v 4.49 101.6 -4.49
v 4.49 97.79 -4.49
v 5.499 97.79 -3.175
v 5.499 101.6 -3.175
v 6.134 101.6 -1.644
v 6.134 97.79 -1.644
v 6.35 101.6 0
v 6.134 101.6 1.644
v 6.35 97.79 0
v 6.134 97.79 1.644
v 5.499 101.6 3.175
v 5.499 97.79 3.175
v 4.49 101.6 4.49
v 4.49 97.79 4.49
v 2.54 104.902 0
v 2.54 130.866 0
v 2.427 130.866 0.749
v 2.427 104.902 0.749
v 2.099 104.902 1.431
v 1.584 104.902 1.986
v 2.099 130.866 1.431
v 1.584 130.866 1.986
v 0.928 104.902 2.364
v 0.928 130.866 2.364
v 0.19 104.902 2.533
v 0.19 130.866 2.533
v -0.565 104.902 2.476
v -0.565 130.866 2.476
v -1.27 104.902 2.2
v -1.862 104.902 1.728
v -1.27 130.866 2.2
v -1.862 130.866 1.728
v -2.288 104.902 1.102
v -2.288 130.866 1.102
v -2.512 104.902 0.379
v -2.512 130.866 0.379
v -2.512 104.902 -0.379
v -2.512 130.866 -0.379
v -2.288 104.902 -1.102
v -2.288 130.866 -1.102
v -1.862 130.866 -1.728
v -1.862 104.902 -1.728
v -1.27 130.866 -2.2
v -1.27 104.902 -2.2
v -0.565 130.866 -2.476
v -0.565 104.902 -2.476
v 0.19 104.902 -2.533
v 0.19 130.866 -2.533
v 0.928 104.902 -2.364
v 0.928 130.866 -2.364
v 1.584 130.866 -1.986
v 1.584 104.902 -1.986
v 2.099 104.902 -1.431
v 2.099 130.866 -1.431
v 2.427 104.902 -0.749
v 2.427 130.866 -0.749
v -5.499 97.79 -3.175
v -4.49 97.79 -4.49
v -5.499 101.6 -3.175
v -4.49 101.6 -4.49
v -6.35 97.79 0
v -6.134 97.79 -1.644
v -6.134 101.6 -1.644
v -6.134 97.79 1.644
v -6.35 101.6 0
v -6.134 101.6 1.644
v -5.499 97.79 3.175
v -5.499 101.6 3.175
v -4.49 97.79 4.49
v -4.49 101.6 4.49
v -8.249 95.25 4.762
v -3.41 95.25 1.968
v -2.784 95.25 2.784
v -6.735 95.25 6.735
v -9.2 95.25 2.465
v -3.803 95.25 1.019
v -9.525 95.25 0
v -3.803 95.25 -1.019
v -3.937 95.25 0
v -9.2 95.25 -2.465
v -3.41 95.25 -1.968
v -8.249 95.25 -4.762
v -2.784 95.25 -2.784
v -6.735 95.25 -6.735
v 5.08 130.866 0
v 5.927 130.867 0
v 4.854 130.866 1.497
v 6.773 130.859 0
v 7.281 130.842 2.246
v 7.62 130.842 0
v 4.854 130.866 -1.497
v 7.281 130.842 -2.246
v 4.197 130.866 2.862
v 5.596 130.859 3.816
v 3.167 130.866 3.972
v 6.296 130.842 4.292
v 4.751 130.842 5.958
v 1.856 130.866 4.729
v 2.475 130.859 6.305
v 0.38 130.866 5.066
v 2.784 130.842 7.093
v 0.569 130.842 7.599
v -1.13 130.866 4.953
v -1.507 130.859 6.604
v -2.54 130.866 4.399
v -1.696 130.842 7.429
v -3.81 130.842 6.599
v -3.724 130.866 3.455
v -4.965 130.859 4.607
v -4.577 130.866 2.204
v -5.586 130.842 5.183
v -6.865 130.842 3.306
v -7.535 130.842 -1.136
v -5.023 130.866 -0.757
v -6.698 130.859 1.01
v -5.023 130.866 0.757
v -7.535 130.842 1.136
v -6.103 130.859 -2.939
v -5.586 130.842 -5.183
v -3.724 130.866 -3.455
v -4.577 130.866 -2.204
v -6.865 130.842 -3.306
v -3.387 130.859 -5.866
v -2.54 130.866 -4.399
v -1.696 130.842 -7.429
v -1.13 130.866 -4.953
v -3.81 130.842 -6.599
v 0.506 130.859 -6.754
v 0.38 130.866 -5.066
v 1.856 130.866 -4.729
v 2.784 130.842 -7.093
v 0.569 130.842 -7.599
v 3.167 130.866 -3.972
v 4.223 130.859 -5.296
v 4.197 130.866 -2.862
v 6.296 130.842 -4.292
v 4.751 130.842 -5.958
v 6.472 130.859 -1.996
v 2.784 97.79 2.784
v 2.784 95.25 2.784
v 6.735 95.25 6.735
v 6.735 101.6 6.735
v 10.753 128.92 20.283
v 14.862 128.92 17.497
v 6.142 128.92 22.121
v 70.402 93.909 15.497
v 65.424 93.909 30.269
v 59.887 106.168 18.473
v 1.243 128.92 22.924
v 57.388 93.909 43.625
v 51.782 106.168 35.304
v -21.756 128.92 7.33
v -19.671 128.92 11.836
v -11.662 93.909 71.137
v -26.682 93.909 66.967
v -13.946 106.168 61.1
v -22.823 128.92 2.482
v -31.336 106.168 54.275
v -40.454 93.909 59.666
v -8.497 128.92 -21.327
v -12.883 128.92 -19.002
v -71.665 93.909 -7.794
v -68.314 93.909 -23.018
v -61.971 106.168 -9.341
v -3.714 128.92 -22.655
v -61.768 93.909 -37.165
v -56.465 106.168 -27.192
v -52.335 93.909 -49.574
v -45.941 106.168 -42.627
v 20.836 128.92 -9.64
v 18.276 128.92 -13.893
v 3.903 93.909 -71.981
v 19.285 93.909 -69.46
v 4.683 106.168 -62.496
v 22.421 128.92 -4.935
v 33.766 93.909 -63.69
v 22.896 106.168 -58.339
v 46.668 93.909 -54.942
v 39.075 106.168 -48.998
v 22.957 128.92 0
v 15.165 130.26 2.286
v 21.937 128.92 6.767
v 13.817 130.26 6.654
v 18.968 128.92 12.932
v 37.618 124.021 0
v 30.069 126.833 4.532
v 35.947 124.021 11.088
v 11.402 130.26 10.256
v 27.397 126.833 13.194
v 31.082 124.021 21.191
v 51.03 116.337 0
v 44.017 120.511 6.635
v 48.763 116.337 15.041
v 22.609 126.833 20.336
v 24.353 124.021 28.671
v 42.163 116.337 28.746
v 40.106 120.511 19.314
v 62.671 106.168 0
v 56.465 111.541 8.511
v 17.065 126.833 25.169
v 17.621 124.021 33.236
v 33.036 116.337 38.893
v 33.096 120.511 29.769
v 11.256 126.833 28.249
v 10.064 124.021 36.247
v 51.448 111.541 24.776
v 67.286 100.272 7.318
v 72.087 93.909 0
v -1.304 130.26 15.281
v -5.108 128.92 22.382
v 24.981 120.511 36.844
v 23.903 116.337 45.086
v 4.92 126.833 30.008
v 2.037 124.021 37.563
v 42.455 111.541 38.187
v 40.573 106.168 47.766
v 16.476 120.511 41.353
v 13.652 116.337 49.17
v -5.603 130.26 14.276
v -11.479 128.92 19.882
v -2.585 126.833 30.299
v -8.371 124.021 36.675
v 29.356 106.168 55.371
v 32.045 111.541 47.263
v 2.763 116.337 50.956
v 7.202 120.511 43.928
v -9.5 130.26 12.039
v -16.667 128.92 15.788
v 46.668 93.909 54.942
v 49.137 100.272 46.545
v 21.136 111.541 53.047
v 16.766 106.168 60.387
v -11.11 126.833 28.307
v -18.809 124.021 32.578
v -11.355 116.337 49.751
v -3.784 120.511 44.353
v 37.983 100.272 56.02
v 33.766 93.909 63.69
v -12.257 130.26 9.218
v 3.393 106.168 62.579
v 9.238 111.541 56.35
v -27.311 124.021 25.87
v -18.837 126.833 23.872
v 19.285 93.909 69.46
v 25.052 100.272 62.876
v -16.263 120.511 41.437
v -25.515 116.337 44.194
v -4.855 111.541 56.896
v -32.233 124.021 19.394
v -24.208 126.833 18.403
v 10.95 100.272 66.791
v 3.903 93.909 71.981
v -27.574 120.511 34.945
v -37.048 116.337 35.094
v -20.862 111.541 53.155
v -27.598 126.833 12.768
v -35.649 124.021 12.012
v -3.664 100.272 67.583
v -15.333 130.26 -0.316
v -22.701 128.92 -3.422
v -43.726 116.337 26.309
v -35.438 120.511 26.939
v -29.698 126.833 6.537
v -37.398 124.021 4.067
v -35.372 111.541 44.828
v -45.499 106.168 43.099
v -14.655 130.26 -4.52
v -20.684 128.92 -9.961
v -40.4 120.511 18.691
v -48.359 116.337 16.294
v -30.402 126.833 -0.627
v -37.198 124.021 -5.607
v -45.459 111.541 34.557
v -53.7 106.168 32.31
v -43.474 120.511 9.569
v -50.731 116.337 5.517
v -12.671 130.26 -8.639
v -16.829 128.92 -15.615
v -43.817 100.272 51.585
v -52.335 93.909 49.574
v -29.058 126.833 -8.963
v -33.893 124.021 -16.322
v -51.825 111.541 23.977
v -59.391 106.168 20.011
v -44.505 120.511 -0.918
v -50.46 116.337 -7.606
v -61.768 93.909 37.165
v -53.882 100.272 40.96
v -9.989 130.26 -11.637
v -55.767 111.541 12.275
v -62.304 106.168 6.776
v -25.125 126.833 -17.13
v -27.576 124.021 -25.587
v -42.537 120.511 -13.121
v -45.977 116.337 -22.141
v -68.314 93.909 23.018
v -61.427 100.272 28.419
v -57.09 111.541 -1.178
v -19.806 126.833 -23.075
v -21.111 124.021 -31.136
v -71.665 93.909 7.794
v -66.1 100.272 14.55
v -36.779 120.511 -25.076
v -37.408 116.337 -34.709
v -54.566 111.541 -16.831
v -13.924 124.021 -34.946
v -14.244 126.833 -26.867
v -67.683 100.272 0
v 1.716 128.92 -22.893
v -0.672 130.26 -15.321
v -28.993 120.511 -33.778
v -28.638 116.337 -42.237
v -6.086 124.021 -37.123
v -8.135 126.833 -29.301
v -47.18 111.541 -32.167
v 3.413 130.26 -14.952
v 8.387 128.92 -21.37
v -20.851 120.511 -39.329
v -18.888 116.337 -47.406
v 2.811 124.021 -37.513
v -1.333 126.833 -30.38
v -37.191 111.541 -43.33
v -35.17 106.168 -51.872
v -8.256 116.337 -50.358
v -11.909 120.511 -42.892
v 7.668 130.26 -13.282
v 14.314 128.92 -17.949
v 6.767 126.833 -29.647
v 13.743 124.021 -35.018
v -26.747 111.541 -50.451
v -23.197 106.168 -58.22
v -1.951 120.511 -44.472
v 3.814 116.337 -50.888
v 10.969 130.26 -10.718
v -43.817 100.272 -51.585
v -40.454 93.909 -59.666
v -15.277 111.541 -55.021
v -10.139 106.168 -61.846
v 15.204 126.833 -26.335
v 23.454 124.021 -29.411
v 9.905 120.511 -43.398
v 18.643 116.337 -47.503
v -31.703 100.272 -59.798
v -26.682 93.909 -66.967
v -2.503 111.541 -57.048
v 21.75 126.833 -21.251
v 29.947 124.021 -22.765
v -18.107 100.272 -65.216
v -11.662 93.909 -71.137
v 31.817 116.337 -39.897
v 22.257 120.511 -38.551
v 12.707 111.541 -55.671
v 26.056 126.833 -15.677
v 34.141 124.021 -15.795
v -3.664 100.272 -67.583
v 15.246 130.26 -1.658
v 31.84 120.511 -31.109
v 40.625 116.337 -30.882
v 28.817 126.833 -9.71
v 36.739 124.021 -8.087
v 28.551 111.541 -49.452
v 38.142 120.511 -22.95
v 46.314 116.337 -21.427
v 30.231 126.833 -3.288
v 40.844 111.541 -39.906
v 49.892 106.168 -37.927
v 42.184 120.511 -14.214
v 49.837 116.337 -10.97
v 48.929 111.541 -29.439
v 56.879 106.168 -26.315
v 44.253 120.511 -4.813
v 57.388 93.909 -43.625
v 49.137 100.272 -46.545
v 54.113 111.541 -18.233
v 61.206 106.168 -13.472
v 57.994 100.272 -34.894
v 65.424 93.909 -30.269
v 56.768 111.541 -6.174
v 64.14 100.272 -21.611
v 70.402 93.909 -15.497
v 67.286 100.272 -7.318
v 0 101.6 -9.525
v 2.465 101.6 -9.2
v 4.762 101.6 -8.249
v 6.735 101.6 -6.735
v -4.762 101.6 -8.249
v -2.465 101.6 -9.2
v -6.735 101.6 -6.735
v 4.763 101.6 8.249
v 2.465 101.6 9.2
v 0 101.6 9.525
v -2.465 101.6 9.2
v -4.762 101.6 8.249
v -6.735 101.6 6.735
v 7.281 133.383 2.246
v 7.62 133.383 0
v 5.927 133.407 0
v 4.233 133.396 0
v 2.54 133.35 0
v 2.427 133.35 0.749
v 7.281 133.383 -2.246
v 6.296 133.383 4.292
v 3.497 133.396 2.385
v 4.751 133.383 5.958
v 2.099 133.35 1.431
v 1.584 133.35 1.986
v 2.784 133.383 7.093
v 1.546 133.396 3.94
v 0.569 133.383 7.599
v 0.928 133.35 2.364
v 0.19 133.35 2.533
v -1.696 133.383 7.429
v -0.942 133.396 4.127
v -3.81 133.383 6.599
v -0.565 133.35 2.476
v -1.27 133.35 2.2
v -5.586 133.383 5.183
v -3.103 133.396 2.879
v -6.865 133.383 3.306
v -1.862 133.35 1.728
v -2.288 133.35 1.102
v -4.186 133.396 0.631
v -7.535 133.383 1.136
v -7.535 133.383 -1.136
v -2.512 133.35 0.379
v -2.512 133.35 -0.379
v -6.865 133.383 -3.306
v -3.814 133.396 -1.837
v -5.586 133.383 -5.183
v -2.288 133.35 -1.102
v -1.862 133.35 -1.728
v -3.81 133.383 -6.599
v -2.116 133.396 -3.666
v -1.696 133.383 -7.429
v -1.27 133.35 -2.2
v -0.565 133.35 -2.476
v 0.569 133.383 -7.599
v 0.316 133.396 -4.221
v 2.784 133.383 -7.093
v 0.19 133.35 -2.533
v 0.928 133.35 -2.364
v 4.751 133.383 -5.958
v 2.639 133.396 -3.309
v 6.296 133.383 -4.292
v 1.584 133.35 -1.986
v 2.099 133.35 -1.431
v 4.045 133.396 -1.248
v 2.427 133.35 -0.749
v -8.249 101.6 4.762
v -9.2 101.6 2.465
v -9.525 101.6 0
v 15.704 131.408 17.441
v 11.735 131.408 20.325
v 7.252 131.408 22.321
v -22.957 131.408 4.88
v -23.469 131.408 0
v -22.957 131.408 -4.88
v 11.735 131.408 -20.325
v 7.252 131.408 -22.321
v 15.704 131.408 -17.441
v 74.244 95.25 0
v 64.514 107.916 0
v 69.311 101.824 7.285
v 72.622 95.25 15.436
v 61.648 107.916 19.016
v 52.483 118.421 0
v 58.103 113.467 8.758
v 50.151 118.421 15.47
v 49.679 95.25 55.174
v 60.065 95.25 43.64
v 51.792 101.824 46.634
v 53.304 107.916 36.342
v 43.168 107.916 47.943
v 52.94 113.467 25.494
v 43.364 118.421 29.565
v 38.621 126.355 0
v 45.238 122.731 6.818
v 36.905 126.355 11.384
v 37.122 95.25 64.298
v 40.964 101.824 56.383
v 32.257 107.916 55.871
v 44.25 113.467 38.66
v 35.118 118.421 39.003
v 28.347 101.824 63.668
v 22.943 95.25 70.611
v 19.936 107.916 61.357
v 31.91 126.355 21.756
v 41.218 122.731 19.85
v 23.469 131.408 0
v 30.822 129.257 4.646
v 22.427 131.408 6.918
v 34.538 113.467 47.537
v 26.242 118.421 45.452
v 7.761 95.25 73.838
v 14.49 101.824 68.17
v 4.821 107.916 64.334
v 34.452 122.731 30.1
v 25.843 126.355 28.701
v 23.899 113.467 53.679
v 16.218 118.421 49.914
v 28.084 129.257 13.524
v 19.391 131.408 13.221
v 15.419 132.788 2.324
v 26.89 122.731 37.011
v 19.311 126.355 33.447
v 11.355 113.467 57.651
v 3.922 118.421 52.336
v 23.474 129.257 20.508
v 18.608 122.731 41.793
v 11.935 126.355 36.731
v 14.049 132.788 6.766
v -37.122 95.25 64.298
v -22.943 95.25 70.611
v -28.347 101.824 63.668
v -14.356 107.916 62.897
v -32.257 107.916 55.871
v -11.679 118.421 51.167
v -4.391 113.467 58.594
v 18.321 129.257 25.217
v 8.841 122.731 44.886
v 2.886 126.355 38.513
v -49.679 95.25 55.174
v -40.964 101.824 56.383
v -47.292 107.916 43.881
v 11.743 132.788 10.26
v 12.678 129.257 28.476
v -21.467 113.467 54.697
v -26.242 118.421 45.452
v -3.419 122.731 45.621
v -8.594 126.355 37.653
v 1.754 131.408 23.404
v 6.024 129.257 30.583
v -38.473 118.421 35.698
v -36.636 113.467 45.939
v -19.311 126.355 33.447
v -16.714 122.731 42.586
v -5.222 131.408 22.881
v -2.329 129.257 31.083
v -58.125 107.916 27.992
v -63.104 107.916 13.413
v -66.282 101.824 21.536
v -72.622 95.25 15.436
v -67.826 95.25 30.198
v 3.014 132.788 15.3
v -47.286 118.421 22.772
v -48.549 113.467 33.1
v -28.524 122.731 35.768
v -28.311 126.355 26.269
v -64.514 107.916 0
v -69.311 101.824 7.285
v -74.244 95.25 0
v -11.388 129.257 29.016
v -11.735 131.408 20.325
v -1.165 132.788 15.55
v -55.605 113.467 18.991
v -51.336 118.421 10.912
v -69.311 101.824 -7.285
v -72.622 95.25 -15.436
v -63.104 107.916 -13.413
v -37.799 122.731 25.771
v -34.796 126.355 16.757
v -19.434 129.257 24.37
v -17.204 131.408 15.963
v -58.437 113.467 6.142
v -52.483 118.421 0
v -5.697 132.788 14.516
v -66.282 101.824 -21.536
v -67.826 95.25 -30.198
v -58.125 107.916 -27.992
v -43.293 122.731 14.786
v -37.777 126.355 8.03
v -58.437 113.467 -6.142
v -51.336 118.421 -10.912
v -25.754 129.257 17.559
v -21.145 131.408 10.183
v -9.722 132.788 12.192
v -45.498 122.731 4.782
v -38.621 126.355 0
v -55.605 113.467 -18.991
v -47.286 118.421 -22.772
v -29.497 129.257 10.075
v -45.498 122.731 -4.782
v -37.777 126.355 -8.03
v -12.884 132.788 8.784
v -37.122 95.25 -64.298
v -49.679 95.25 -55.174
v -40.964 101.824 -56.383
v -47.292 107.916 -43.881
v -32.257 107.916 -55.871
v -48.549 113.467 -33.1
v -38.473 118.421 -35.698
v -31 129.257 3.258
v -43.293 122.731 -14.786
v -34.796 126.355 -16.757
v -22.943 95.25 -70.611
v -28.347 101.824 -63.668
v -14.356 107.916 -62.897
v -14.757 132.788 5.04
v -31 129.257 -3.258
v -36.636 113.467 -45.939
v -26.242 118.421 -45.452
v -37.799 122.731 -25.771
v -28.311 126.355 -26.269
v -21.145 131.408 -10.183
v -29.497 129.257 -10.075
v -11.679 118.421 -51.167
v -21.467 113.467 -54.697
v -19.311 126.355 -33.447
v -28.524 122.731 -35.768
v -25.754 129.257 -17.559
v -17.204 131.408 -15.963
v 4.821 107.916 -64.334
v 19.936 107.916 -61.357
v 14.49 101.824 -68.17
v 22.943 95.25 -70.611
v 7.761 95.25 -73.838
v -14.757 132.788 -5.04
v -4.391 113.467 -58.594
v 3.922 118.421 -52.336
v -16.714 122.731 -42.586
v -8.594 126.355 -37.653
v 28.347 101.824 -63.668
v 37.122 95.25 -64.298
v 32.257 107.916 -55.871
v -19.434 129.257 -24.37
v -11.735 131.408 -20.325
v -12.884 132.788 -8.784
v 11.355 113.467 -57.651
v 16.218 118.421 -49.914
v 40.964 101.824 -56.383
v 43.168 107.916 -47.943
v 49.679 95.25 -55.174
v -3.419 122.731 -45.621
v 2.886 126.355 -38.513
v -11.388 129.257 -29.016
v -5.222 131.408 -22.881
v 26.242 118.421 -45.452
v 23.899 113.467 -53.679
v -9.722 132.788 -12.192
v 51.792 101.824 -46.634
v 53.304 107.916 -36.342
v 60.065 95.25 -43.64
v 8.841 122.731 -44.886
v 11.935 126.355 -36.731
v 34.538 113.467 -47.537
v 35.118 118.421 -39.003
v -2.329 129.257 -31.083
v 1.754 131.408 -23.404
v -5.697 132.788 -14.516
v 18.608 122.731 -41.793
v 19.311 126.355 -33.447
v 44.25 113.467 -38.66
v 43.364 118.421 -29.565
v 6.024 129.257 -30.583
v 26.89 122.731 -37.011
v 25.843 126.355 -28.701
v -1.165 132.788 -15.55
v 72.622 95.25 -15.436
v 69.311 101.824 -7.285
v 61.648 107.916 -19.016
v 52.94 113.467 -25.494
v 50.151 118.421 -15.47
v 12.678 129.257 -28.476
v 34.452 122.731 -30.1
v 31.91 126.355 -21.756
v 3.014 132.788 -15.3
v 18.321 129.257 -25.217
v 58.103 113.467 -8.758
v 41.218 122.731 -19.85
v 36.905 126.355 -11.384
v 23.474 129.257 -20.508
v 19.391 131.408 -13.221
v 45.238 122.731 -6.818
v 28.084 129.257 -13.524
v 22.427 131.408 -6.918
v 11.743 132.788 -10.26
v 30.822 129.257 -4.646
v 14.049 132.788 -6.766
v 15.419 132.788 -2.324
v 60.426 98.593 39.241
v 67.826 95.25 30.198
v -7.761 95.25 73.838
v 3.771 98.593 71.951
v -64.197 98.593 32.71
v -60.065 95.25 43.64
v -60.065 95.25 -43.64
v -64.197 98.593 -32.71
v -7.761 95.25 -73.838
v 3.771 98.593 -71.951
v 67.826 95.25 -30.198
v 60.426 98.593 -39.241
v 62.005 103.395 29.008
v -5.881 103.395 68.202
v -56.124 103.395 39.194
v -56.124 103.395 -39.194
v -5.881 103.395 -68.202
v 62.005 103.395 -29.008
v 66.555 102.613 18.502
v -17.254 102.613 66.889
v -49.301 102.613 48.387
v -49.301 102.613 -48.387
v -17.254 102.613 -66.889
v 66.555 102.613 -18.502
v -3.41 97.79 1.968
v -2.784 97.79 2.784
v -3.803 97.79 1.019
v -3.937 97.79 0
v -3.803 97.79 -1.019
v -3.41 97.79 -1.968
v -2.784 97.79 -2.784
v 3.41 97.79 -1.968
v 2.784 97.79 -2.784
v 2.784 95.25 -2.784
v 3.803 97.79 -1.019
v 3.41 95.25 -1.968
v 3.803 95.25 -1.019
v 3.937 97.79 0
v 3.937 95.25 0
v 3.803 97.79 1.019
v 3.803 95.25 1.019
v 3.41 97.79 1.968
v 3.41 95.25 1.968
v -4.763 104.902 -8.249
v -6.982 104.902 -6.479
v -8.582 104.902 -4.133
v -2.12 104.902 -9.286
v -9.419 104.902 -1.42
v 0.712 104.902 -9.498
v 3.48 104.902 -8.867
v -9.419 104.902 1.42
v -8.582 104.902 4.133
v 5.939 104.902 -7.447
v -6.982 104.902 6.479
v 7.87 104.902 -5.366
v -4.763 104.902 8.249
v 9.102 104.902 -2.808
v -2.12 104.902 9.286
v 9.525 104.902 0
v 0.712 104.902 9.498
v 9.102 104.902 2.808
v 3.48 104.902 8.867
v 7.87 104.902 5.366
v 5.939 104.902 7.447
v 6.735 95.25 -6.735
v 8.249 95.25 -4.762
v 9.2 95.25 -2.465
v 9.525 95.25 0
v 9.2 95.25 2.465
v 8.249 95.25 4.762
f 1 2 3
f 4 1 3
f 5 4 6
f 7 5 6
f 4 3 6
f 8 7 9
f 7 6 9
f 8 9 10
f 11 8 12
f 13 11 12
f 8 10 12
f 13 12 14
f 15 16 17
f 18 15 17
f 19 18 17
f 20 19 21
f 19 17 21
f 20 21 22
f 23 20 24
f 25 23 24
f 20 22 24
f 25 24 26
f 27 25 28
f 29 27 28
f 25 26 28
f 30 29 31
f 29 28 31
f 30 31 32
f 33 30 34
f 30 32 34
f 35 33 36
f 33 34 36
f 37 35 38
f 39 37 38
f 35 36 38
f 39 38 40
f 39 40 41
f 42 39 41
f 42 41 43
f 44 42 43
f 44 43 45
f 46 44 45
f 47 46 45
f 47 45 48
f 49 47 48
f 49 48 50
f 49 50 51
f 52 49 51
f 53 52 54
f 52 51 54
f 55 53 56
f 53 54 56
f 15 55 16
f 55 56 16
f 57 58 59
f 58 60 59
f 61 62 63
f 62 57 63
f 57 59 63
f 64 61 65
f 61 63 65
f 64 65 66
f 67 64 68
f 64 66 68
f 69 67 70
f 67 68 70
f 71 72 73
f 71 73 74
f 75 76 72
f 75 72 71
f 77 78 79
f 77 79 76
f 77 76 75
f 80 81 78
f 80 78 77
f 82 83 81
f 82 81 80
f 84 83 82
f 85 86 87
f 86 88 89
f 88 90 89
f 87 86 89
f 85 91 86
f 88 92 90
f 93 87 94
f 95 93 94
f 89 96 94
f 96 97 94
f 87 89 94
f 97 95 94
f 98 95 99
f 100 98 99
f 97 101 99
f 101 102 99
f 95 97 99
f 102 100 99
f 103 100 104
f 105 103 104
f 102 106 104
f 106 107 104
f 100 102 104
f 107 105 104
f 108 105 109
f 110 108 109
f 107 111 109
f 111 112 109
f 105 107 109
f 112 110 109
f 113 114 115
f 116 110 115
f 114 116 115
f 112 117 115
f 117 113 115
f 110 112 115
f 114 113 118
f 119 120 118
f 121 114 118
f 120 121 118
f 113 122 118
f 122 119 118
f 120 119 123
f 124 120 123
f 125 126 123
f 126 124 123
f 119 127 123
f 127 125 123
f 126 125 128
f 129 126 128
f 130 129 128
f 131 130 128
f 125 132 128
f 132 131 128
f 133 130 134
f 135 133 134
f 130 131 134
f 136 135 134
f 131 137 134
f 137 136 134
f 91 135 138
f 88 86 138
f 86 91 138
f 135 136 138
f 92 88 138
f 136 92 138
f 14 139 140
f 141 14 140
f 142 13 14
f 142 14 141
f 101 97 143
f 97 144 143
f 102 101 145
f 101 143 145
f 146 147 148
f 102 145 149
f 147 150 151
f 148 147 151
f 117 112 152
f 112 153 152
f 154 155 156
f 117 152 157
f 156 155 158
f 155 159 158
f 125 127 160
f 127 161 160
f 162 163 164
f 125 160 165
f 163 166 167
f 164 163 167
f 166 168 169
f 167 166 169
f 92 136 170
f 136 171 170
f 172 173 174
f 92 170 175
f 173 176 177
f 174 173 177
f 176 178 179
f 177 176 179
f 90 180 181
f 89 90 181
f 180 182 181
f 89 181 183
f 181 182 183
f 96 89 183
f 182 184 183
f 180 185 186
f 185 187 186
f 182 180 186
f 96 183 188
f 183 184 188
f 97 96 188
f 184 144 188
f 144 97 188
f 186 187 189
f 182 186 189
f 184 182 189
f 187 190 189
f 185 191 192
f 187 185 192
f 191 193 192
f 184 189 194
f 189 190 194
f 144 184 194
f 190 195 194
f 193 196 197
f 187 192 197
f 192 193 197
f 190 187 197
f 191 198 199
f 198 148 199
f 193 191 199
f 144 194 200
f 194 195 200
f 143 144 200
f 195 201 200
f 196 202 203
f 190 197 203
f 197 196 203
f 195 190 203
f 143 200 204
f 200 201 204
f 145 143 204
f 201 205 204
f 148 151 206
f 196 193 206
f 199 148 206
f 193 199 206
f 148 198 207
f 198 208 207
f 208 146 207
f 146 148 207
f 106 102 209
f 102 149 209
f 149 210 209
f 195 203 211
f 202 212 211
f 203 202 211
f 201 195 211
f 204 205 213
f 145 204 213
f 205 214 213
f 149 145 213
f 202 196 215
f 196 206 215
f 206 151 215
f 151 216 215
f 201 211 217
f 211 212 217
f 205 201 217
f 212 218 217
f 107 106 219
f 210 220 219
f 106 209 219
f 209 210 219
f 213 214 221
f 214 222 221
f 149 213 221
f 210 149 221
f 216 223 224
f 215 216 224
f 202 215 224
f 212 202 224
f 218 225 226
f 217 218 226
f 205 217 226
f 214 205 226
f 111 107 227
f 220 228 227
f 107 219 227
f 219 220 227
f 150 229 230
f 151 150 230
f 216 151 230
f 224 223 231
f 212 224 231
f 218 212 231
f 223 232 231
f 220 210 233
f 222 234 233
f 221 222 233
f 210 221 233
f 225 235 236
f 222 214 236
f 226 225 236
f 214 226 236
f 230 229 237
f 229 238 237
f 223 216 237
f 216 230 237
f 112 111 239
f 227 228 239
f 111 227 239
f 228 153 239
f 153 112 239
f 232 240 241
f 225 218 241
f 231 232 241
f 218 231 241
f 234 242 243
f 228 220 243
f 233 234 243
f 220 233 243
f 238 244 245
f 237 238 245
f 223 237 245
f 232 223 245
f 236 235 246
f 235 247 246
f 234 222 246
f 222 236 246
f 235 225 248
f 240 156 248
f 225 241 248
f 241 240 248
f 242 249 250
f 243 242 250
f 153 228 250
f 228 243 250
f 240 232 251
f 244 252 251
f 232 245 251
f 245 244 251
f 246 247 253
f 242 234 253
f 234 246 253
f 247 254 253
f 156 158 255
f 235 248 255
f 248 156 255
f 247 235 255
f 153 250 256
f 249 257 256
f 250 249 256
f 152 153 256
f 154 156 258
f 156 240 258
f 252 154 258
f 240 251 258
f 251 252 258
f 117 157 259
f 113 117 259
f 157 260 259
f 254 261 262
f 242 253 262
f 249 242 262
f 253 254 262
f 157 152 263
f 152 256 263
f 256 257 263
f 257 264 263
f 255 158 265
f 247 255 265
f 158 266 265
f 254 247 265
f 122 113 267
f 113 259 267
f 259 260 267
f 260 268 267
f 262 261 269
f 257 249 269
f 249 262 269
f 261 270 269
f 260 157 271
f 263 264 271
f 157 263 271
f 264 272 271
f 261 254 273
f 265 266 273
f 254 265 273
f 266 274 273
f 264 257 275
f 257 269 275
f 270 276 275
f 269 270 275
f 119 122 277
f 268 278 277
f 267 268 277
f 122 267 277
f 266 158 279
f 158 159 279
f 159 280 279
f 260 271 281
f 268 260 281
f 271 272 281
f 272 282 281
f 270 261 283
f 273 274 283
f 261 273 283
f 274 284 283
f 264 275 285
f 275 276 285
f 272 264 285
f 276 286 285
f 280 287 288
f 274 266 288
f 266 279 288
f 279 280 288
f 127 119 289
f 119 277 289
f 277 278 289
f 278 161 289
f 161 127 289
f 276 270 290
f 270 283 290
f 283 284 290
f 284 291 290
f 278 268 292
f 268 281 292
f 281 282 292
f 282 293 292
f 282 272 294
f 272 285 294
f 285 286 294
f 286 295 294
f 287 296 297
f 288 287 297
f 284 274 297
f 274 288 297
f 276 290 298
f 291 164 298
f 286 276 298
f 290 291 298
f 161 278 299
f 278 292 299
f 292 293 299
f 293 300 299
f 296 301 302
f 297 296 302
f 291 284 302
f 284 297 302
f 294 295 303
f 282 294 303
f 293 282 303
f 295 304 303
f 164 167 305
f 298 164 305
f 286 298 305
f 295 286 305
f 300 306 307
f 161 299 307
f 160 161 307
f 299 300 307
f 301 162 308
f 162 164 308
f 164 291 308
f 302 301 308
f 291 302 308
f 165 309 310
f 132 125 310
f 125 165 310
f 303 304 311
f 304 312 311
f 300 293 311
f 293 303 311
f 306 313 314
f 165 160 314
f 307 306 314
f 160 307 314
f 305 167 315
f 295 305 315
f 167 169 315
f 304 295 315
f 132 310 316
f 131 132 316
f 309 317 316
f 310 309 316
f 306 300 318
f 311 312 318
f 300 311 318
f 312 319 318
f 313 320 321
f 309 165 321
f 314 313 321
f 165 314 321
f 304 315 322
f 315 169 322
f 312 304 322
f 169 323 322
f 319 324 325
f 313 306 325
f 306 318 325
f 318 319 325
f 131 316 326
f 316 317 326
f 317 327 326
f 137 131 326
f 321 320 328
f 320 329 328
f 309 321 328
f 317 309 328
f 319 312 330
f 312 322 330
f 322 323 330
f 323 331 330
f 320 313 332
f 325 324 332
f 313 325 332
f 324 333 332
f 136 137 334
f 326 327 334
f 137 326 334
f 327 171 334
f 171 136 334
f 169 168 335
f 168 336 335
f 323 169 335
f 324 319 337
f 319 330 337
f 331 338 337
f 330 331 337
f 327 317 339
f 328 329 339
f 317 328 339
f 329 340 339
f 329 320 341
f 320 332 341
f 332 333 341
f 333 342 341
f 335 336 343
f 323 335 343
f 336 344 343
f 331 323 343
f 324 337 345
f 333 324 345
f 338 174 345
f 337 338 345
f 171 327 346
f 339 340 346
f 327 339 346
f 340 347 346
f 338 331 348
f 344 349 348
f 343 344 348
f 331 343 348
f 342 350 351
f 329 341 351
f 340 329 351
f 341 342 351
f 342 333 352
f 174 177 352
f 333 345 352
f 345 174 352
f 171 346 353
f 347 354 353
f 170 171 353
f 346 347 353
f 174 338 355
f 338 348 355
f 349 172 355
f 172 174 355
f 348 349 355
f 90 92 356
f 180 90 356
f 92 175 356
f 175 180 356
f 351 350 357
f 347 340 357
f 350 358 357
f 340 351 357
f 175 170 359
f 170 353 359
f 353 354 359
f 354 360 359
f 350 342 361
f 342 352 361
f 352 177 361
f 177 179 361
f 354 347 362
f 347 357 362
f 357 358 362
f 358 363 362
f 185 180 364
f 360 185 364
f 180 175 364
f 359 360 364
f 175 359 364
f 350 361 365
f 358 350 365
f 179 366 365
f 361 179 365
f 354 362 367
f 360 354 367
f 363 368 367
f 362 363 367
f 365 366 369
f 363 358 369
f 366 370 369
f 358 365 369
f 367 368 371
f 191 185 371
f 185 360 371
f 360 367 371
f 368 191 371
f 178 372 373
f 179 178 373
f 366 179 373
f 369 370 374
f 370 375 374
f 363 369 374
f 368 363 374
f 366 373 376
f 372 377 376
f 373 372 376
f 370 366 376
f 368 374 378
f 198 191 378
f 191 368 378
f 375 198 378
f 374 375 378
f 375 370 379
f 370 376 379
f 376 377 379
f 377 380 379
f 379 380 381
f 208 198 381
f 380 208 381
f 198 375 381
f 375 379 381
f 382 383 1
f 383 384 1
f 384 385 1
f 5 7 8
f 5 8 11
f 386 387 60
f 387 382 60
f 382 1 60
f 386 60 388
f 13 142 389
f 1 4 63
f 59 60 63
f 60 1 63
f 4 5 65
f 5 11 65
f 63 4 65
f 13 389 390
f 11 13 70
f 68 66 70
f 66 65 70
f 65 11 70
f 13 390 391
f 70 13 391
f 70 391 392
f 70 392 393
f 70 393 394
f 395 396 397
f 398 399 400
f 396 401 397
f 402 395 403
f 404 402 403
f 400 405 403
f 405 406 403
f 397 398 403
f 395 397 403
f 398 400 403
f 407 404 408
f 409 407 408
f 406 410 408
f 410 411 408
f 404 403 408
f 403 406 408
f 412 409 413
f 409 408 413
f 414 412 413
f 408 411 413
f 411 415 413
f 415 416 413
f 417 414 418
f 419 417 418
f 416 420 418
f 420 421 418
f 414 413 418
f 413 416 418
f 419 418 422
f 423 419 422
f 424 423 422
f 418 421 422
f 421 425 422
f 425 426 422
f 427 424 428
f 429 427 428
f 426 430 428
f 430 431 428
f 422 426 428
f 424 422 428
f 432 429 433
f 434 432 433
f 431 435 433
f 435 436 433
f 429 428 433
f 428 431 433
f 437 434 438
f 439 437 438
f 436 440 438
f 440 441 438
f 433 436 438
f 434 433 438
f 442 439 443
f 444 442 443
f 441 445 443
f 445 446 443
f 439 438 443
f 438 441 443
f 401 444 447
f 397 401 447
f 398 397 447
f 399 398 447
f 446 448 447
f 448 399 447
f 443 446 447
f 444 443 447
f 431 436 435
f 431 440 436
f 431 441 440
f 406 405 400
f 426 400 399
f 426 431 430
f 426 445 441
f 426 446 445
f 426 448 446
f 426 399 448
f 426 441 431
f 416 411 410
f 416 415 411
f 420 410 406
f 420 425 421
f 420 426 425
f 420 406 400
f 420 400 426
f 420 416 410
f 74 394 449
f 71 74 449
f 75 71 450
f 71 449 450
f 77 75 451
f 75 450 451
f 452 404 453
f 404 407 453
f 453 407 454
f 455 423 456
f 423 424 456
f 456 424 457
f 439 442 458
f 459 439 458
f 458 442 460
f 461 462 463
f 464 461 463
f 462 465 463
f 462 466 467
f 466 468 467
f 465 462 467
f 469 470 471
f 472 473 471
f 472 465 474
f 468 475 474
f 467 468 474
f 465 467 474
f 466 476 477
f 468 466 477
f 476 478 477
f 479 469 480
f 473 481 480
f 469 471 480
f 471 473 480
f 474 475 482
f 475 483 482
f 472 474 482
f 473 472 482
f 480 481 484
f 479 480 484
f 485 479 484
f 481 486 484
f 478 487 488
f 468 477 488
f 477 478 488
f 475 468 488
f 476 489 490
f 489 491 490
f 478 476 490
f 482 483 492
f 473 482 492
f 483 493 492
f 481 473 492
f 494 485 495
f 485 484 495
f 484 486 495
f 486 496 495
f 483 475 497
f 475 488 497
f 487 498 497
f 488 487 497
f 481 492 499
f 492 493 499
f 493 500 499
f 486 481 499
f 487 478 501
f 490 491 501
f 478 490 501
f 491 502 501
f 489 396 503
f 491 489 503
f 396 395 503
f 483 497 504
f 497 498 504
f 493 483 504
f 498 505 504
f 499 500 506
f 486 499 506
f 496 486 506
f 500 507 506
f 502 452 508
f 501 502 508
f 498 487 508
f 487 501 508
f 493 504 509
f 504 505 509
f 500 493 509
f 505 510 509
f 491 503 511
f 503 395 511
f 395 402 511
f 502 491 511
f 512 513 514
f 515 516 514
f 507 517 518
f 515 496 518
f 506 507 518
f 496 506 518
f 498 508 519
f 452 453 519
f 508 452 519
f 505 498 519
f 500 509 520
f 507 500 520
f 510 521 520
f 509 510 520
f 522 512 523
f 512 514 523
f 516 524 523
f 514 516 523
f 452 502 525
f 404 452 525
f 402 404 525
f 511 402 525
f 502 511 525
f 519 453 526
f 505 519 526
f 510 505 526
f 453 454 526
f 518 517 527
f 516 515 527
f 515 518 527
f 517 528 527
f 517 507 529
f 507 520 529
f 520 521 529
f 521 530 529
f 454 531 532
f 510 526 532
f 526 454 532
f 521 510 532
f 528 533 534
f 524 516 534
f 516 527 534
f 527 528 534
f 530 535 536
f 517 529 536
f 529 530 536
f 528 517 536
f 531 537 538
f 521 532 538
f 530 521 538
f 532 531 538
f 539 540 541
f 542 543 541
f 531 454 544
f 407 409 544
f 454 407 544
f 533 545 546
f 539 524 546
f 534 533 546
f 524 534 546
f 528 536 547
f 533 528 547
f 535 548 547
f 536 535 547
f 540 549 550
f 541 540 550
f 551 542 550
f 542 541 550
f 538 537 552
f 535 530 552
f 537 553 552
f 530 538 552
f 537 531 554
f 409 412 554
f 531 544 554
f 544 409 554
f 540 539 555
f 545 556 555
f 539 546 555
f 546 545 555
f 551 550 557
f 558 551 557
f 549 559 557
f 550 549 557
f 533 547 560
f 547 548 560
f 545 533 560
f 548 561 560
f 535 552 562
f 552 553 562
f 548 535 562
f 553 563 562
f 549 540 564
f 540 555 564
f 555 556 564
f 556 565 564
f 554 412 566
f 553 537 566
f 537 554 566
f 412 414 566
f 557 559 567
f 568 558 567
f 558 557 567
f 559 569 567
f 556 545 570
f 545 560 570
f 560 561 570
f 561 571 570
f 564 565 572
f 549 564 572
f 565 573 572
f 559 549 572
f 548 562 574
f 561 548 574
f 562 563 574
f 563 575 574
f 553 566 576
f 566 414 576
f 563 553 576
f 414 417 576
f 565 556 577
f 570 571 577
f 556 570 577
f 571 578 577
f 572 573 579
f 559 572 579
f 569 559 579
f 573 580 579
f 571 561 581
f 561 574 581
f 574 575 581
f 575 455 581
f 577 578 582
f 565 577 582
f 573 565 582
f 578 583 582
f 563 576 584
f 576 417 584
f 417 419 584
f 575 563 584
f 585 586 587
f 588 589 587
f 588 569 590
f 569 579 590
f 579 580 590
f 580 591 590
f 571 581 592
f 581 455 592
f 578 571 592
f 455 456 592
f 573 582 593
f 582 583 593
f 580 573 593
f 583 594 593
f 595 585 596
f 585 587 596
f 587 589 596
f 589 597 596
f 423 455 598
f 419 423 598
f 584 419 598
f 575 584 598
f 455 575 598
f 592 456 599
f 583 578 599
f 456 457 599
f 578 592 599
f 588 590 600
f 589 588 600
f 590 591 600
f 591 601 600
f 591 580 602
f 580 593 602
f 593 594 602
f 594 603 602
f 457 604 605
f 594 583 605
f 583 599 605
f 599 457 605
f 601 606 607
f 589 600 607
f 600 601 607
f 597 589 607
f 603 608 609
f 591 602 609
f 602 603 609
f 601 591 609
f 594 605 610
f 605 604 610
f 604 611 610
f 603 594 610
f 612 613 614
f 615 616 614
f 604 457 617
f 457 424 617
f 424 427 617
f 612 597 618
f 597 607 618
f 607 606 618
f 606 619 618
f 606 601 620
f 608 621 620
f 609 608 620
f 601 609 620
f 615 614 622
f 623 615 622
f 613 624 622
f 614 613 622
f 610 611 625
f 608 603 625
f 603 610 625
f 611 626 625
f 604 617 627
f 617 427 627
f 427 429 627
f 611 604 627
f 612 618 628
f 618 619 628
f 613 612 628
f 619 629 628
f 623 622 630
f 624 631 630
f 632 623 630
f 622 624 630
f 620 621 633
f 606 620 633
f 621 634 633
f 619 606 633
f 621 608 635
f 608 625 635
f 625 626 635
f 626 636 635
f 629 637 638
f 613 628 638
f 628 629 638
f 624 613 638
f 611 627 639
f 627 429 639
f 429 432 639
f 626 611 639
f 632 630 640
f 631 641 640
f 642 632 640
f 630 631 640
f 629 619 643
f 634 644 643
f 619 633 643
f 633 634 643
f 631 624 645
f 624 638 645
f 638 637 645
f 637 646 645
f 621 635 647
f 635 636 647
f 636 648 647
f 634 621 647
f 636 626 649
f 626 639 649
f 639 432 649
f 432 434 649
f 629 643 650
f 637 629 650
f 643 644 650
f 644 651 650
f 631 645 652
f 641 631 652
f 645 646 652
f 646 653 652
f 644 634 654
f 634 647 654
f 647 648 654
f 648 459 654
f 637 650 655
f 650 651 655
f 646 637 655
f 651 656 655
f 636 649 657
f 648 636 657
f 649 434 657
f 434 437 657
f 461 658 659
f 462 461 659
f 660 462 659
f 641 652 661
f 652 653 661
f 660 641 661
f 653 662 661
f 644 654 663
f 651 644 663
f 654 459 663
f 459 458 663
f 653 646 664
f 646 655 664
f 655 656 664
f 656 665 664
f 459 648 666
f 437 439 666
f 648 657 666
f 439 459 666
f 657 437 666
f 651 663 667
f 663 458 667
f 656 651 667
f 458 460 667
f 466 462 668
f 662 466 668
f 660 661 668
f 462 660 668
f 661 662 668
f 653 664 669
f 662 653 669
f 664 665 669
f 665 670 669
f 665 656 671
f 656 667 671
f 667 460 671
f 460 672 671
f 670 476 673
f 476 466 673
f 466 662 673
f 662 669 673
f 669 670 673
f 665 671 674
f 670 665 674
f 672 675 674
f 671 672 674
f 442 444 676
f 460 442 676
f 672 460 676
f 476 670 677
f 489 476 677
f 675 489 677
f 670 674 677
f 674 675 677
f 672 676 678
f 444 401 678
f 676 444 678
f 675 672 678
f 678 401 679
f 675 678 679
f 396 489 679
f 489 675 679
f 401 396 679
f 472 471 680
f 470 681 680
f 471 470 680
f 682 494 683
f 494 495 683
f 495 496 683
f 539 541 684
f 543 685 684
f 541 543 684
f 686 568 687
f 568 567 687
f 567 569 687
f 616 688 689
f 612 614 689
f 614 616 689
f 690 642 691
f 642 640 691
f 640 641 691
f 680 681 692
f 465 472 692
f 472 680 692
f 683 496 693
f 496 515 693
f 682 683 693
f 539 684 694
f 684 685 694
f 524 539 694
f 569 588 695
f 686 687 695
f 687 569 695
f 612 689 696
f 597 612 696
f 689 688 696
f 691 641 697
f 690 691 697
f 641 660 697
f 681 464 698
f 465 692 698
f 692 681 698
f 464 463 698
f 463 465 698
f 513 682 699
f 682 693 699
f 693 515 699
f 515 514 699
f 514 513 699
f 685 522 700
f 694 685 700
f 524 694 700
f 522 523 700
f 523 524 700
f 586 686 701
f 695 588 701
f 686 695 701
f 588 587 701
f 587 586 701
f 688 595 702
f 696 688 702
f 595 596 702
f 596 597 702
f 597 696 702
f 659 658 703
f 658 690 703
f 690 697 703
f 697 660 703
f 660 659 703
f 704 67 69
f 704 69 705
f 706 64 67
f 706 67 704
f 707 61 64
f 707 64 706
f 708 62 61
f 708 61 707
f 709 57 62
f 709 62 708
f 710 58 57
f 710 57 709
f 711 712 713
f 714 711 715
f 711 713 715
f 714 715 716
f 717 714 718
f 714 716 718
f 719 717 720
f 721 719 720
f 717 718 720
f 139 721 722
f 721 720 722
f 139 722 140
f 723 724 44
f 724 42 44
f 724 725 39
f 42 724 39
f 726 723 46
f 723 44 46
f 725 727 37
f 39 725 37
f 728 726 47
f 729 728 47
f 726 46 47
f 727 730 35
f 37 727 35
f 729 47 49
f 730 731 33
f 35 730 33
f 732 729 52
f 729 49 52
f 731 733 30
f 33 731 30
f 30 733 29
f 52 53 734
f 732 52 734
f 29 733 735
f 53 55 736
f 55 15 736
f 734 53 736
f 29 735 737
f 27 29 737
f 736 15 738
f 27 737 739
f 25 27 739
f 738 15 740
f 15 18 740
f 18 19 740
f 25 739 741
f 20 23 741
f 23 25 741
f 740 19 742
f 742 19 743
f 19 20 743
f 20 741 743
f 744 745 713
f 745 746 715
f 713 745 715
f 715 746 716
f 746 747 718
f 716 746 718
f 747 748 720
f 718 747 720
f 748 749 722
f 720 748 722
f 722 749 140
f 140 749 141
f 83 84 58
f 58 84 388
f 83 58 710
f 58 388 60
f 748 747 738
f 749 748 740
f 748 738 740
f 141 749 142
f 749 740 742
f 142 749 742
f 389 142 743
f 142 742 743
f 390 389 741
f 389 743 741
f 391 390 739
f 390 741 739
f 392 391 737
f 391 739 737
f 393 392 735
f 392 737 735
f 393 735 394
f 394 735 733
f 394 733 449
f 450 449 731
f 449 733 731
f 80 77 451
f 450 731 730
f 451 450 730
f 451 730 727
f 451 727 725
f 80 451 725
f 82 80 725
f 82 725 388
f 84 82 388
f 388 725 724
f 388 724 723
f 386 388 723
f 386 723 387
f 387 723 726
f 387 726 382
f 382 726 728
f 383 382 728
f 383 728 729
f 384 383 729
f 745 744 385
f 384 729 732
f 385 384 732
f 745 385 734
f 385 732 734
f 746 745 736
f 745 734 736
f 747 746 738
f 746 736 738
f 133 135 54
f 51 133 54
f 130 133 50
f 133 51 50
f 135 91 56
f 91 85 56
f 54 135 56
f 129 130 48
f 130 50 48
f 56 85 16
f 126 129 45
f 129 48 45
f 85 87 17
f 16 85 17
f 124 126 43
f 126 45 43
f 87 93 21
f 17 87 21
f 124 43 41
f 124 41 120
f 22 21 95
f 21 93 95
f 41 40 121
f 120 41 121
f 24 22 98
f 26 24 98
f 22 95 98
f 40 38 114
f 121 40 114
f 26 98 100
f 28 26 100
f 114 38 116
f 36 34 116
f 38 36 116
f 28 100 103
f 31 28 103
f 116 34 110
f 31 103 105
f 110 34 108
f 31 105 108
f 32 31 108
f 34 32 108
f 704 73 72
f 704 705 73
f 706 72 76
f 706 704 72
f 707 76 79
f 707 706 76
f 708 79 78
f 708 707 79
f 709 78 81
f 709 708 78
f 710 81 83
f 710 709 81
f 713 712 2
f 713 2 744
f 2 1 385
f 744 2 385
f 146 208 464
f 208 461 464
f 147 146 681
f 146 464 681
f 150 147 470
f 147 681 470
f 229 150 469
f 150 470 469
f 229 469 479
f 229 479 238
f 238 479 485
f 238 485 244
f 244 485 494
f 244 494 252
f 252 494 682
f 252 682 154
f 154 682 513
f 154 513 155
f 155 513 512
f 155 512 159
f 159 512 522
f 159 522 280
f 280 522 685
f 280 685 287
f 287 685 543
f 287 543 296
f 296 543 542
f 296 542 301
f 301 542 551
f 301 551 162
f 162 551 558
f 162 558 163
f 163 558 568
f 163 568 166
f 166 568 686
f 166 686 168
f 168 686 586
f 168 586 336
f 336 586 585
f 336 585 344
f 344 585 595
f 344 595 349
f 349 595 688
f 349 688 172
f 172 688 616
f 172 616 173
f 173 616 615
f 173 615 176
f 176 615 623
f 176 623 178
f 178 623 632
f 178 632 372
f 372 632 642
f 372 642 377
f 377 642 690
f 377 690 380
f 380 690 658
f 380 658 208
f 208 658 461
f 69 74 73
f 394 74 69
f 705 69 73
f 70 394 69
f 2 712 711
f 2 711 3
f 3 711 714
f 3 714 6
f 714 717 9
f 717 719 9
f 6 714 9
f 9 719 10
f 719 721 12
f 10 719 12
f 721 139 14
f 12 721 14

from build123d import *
from build123d.topology import SkipClean

# Parameters (mm, degrees)
REVOLVE5_ANGLE = 90
SKETCH1_24_W   = 2.54
SKETCH1_24_H   = 28.448


with BuildPart() as part:
    # Sketch1 → Revolve4 (revolve)
    with BuildSketch(Plane.XY):
        Polygon((9.525, 101.6), (9.525, 104.902), (2.54, 104.902), (0, 104.902), (0, 101.6), (6.35, 101.6), align=None)
    revolve(axis=Axis((0, 133.35, 0), (0, -1, 0)))

    # Sketch1<21> → Revolve5 (revolve, symmetric)
    with SkipClean():  # the faces are left unmerged after this step: merging them gives an invalid solid
        with BuildSketch(Plane.XY) as revolve5_sk:
            Polygon((9.525, 95.25), (9.525, 101.6), (6.35, 101.6), (6.35, 97.79), (3.937, 97.79), (3.937, 95.25), align=None)
            Polygon((-6.35, 97.79), (-6.35, 101.6), (-9.525, 101.6), (-9.525, 95.25), (-3.937, 95.25), (-3.937, 97.79), align=None)
        revolve(axis=Axis((0, 133.35, 0), (0, -1, 0)), revolution_arc=REVOLVE5_ANGLE / 2)
        revolve(revolve5_sk.sketch, axis=Axis((0, 133.35, 0), (0, 1, 0)), revolution_arc=REVOLVE5_ANGLE / 2)

    # Sketch1<24> → Revolve7 (revolve)
    with SkipClean():  # the faces are left unmerged after this step: merging them gives an invalid solid
        with BuildSketch(Plane.XY):
            with Locations((1.27, 119.126)):
                Rectangle(SKETCH1_24_W, SKETCH1_24_H)
        revolve(axis=Axis((0, 133.35, 0), (0, -1, 0)))

    # Sketch1<32> → Revolve8 (revolve)
    with SkipClean():  # the faces are left unmerged after this step: merging them gives an invalid solid
        with BuildSketch(Plane.XY):
            with BuildLine():
                ThreePointArc((7.619929338, 133.38281581), (5.07970677, 133.406330996), (2.54, 133.35))
                Line((2.54, 133.35), (0, 133.35))
                Line((0, 133.35), (0, 130.866278235))
                Line((0, 130.866278235), (5.08, 130.866278235))
                ThreePointArc((5.08, 130.866278235), (6.350063158, 130.864440752), (7.619929338, 130.841997813))
                Line((7.619929338, 130.841997813), (7.619929338, 133.38281581))
            make_face()
        revolve(axis=Axis((0, 133.35, 0), (0, -1, 0)))

    # Sketch1<36> → Revolve9 (revolve)
    with SkipClean():  # the faces are left unmerged after this step: merging them gives an invalid solid
        with BuildSketch(Plane.XY):
            with BuildLine():
                Line((7.619929338, 133.38281581), (7.619929338, 130.841997813))
                ThreePointArc((7.619929338, 130.841997813), (44.514359536, 120.511244071), (72.087103792, 93.909228608))
                Line((72.087103792, 93.909228608), (74.244401193, 95.25))
                ThreePointArc((74.244401193, 95.25), (45.748561471, 122.731465818), (7.619929338, 133.38281581))
            make_face()
        revolve(axis=Axis((0, 133.35, 0), (0, -1, 0)))


solid = part.part
